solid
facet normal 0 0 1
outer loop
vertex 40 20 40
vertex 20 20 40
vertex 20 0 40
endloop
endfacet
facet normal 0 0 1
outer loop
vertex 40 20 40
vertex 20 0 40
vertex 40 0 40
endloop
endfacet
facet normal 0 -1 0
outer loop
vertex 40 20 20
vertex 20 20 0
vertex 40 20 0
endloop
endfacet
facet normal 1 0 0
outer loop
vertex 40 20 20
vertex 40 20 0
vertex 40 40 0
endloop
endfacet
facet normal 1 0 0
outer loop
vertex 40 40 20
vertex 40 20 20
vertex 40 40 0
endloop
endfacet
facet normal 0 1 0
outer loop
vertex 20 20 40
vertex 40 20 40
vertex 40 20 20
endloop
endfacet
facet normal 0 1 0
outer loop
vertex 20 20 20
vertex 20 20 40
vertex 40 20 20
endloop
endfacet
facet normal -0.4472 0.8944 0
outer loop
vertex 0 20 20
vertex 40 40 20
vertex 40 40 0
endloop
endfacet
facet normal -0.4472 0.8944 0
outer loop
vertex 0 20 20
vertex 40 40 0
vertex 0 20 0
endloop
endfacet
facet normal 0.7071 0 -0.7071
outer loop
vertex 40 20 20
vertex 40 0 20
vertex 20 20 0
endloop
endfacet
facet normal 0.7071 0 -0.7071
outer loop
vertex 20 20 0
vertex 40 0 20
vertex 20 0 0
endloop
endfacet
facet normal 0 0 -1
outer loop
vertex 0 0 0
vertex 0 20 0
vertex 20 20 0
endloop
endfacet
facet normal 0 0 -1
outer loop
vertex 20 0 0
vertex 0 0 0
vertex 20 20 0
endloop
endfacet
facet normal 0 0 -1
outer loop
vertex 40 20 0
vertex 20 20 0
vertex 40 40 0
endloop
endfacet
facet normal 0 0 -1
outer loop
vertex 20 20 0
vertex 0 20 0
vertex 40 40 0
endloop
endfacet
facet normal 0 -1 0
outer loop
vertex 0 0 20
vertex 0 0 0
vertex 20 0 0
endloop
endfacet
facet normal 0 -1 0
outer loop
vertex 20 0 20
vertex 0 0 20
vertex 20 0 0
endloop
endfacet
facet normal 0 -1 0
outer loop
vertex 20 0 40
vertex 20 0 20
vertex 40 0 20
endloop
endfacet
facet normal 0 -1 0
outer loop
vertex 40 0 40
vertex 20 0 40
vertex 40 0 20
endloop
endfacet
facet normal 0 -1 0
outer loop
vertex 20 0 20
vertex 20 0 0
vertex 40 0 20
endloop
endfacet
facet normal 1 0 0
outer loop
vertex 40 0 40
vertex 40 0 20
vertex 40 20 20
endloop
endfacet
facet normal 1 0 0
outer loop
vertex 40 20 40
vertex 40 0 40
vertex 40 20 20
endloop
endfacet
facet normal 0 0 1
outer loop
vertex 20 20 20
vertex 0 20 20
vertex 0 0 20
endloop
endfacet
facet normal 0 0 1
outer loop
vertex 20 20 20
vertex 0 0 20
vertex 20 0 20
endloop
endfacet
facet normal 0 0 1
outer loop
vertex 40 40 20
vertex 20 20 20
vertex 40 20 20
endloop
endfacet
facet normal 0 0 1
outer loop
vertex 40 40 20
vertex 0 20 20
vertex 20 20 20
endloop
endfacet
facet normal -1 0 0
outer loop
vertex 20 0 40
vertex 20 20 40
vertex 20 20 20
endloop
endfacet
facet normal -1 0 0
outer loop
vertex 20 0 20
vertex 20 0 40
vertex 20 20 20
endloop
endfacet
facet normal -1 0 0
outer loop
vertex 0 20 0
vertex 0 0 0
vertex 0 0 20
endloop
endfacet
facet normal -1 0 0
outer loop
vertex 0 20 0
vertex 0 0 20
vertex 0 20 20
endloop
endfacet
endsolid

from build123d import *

# Parameters (mm, degrees)
SKETCH1_W           = 40
SKETCH1_H           = 40
BOSS_EXTRUDE1_DEPTH = 40
CUT_EXTRUDE1_DEPTH  = 40
SKETCH3_W           = 20
SKETCH3_H           = 20
CUT_EXTRUDE2_DEPTH  = 40
CUT_EXTRUDE3_DEPTH  = 20
SKETCH5_W           = 20
SKETCH5_H           = 20
CUT_EXTRUDE4_DEPTH  = 20


with BuildPart() as part:
    # Sketch1 → Boss-Extrude1 (new body)
    with BuildSketch(Plane.XY):
        with Locations((20, 20)):
            Rectangle(SKETCH1_W, SKETCH1_H)
    extrude(amount=BOSS_EXTRUDE1_DEPTH)

    # Sketch2 → Cut-Extrude1 (cut)
    with BuildSketch(Plane.XY.offset(40)):
        Polygon((40, 40), (0, 20), (0, 40), align=None)
    extrude(amount=-CUT_EXTRUDE1_DEPTH, mode=Mode.SUBTRACT)

    # Sketch3 → Cut-Extrude2 (cut)
    with BuildSketch(Plane(origin=(40, 0, 0), x_dir=(0, 0, -1), z_dir=(1, 0, 0))):
        with Locations((-30, 30)):
            Rectangle(SKETCH3_W, SKETCH3_H)
    extrude(amount=-CUT_EXTRUDE2_DEPTH, mode=Mode.SUBTRACT)

    # Sketch4 → Cut-Extrude3 (cut)
    with BuildSketch(Plane.XZ):
        Polygon((40, 0), (40, 20), (20, 0), align=None)
    extrude(amount=-CUT_EXTRUDE3_DEPTH, mode=Mode.SUBTRACT)

    # Sketch5 → Cut-Extrude4 (cut)
    with BuildSketch(Plane(origin=(0, 20, 0), x_dir=(1, 0, 0), z_dir=(0, 1, 0))):
        with Locations((10, -30)):
            Rectangle(SKETCH5_W, SKETCH5_H)
    extrude(amount=-CUT_EXTRUDE4_DEPTH, mode=Mode.SUBTRACT)


solid = part.part
